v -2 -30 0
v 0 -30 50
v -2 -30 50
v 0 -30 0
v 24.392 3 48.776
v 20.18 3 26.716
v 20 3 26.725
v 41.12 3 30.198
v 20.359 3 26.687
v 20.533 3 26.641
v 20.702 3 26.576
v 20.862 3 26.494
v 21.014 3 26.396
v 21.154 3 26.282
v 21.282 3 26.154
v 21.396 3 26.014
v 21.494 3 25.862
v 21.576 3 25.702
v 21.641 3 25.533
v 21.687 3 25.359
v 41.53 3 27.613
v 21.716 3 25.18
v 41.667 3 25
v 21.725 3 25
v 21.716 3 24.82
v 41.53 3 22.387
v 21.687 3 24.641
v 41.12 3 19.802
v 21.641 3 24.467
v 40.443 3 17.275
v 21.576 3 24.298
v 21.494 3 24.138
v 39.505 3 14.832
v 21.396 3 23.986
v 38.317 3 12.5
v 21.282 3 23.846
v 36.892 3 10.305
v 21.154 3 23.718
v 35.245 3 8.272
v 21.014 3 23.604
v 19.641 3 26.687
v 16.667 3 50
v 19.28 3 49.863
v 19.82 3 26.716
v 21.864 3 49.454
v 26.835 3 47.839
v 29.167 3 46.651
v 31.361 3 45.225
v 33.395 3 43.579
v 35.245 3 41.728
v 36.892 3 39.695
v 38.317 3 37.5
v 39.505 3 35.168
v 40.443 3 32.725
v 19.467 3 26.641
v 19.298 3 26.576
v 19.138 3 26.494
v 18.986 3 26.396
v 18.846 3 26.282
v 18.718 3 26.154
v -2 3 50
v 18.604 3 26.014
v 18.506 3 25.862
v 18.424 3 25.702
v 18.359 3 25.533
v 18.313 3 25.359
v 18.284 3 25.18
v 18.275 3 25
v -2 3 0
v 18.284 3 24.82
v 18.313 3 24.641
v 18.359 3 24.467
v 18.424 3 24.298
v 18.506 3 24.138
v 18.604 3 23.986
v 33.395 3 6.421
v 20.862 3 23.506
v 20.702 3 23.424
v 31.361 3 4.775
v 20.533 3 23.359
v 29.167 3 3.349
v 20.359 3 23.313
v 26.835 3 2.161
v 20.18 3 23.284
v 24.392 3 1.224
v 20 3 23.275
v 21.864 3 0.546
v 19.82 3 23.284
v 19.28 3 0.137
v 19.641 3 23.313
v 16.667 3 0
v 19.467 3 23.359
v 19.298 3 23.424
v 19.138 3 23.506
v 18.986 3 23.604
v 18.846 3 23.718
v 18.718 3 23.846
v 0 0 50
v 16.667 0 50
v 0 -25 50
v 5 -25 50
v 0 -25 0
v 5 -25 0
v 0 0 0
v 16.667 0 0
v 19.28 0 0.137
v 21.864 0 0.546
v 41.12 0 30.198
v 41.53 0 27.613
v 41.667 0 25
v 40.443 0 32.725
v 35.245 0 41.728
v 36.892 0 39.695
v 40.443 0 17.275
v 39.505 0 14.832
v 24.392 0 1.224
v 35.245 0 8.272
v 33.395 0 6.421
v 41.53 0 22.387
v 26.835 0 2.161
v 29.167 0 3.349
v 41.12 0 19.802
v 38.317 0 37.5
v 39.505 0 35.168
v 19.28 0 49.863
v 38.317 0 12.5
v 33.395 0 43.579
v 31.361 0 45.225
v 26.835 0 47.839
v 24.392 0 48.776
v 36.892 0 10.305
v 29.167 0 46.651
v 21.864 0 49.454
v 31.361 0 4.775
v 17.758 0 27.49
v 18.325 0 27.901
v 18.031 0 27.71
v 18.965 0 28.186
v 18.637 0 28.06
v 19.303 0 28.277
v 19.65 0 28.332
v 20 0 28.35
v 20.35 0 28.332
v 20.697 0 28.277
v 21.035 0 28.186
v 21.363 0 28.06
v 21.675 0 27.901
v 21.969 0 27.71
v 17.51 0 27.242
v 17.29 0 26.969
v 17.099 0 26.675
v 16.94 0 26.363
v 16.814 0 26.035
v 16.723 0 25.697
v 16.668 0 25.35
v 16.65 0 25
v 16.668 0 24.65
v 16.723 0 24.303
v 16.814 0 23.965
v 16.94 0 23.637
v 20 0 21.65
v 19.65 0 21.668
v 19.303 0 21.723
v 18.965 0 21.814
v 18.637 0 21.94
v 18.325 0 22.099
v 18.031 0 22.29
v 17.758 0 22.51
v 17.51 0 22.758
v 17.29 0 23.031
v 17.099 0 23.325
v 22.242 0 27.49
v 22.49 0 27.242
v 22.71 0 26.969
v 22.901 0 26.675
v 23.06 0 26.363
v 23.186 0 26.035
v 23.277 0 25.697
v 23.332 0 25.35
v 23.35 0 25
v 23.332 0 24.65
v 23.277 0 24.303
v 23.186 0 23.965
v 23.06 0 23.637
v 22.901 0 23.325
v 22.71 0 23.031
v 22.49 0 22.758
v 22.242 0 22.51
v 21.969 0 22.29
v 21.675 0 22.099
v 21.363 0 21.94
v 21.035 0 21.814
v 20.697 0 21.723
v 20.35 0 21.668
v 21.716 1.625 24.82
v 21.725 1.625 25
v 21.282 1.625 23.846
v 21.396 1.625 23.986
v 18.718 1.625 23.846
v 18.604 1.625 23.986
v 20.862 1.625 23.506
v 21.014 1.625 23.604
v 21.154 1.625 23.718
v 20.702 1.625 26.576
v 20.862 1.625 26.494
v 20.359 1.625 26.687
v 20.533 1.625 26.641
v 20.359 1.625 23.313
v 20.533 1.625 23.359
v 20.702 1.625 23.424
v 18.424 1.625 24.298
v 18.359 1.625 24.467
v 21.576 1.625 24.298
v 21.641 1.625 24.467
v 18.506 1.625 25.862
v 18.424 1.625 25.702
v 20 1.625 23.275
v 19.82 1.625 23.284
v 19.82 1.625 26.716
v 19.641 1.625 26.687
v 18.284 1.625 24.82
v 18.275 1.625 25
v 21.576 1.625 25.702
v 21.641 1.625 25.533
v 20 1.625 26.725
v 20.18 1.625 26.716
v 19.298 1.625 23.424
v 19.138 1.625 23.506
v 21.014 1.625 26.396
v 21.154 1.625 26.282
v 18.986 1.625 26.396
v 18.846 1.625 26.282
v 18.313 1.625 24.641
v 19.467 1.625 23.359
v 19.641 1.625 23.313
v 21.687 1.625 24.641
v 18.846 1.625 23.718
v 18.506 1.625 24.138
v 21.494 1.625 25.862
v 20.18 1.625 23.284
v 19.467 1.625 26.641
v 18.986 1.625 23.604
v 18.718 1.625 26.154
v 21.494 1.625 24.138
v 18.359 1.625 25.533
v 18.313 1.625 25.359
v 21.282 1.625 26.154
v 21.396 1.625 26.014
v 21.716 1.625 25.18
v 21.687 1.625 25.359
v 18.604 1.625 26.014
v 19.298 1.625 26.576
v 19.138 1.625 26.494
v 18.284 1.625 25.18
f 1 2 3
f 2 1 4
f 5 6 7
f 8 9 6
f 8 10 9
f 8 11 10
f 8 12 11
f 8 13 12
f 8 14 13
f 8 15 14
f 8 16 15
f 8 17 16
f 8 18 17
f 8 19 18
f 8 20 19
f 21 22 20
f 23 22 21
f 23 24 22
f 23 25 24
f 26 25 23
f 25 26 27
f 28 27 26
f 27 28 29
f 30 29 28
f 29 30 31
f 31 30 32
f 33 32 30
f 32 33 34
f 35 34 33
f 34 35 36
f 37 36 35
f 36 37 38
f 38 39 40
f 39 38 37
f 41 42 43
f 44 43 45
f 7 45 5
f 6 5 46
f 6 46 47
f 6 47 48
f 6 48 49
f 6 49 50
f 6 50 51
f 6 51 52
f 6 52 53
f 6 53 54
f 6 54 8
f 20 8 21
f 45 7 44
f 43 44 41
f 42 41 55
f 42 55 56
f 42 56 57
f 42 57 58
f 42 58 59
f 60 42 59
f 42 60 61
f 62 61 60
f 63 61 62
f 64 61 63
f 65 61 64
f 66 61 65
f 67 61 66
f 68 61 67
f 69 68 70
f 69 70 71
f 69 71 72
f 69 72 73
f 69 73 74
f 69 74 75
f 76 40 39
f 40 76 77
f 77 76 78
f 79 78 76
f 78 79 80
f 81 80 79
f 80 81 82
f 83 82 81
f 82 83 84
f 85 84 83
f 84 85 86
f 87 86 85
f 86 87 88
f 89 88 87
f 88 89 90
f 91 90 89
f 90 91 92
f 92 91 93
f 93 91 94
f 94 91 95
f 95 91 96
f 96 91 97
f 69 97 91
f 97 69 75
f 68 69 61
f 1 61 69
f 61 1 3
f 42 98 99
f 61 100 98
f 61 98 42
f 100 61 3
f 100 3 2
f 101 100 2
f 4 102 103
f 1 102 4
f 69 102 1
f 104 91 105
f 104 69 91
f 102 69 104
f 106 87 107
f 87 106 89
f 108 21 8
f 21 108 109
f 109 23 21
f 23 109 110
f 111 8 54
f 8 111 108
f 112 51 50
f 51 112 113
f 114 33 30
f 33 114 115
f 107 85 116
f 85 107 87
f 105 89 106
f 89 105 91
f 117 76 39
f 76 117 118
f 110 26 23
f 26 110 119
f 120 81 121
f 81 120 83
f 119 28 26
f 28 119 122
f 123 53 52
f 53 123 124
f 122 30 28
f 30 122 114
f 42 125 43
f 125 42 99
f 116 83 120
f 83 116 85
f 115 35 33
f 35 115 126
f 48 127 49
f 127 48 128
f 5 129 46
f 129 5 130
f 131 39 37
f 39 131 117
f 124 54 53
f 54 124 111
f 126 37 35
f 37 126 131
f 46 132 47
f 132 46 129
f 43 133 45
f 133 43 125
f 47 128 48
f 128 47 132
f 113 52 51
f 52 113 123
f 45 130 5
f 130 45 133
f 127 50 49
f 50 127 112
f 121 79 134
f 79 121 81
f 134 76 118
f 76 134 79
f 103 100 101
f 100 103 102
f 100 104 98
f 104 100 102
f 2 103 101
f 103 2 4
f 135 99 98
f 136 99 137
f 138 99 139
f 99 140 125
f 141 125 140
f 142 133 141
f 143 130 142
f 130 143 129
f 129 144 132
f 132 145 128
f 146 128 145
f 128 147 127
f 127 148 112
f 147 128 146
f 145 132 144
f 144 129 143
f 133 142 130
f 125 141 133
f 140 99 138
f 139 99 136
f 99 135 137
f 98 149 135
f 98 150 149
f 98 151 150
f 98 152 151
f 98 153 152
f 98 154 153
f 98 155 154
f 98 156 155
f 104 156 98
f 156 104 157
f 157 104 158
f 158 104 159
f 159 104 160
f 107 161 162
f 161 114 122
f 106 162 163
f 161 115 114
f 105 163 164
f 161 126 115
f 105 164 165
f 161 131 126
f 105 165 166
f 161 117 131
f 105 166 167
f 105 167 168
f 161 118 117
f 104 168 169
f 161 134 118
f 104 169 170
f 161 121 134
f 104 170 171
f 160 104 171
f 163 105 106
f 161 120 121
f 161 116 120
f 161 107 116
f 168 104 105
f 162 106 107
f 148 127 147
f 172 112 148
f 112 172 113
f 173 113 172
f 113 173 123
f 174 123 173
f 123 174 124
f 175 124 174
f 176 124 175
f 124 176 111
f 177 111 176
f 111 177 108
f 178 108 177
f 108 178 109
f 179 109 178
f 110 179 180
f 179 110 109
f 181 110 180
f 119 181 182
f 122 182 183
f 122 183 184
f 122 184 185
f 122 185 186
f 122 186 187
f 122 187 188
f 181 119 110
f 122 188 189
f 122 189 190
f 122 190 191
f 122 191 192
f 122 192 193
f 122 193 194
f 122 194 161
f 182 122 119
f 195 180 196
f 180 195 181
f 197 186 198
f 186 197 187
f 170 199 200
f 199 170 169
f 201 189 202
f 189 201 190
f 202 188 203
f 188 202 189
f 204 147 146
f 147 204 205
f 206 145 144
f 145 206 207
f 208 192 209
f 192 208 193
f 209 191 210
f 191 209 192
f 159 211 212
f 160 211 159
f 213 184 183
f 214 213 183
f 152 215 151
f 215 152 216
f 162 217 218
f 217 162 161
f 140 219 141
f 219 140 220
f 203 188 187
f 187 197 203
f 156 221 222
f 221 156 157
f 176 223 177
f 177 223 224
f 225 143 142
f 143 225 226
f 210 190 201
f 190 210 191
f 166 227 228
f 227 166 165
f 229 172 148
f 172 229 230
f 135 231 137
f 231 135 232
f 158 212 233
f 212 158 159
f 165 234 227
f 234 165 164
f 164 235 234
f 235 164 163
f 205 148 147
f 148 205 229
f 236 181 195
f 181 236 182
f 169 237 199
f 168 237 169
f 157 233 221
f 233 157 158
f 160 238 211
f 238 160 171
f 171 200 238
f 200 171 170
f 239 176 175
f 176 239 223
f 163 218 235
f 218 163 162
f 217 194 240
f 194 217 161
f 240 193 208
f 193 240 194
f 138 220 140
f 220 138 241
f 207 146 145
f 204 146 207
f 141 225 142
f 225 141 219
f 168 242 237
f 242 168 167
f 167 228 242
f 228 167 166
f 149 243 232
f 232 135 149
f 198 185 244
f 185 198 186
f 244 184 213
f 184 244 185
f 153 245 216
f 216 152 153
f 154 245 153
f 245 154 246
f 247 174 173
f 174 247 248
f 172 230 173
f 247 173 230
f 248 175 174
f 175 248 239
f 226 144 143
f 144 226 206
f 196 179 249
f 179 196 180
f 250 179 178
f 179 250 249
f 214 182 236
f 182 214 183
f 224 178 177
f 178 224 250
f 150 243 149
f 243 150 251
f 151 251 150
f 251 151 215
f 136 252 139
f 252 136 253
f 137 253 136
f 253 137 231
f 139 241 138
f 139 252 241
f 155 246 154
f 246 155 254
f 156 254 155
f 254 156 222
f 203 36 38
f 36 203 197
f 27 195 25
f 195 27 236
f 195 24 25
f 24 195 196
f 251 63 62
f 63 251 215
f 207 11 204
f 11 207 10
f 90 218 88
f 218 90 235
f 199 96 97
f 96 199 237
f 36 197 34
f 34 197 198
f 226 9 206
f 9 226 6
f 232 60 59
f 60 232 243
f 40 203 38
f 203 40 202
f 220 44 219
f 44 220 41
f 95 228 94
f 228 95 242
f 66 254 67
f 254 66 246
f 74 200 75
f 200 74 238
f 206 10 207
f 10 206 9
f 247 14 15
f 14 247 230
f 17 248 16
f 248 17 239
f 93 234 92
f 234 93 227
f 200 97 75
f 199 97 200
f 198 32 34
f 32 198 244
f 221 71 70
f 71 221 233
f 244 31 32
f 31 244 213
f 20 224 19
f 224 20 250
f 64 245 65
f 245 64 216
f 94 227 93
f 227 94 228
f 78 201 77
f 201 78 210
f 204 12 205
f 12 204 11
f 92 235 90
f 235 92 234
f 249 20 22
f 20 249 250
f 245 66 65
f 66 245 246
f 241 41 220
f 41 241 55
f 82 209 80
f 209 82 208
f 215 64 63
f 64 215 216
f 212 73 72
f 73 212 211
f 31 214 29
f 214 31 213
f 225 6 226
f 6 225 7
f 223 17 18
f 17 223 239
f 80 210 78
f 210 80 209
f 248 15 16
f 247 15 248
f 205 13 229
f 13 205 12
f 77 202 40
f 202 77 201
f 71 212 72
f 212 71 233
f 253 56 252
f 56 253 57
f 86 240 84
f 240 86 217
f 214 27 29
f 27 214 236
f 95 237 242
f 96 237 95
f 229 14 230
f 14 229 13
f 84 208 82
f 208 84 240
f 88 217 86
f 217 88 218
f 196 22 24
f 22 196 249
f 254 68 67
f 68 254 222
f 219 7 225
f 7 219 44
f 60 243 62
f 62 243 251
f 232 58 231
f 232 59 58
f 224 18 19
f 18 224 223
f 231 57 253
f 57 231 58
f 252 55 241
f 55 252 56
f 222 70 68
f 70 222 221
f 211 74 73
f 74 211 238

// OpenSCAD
$fn=60;

module clip(width, height, thickness, tooth_size) {
    cube([thickness, width, height + tooth_size]);
    translate([thickness, 0, 0]) translate([0, 0, height]) intersection() {
        cube([tooth_size, width, tooth_size]);
        translate([0, 0, tooth_size]) rotate([0, 135, 0]) cube([tooth_size * sqrt(2), width, tooth_size * sqrt(2)]);
    }
}

module fh_screw_hole(diameter, head_diameter, length) {
    cylinder(d1=head_diameter, d2=0, h=head_diameter/2);
    cylinder(d=diameter, h=length);
}

module surface_mount_corner(
    tolerence=0.1,
    bracket_width=50,
    height=25,
    base_thickness=3,
    clip_thickness=2,
    tooth_size=5,
    screw_diameter=3.45,
    screw_head_diameter=6.90
) {
    rotate([90, 0, 0]) translate([-clip_thickness, -clip_thickness, -base_thickness]) difference() {
        intersection() {
            cube([clip_thickness + bracket_width, clip_thickness + bracket_width, height + tooth_size + base_thickness]);
            cylinder(h=height + tooth_size + base_thickness, r=bracket_width + clip_thickness);
            union() {
                cube([bracket_width + clip_thickness, bracket_width + clip_thickness, base_thickness]);
                translate([0, 0, base_thickness]) clip(width=bracket_width + clip_thickness, height=height, thickness=clip_thickness, tooth_size=tooth_size);
                translate([clip_thickness + tooth_size + tolerence, 0, 0]) mirror([1, 0, 0]) rotate([0, 0, 90]) clip(width=bracket_width + clip_thickness, height=height, thickness=clip_thickness, tooth_size=tooth_size);
            }
        }
        translate([bracket_width/2.5, bracket_width/2.5, base_thickness + 0.1]) rotate([180, 0, 0]) fh_screw_hole(diameter=screw_diameter, head_diameter=screw_head_diameter, length=base_thickness+0.2);
    }
}

module surface_mount_side(
    bracket_width=50,
    height=25,
    base_thickness=3,
    clip_thickness=2,
    tooth_size=5,
    screw_diameter=3.45,
    screw_head_diameter=6.90
) {
    rotate([90, 0, 0]) translate([-clip_thickness, 0, -base_thickness]) difference() {
        intersection() {
            cube([bracket_width + clip_thickness, bracket_width + clip_thickness, height + tooth_size + base_thickness]);
            union() {
                cube([bracket_width/3 + clip_thickness, bracket_width, height + tooth_size + base_thickness]);
                translate([bracket_width/3 + clip_thickness, bracket_width/2, 0]) cylinder(h=height + tooth_size + base_thickness, d=bracket_width);
            }
            union() {
                cube([bracket_width + clip_thickness, bracket_width, base_thickness]);
                translate([0, 0, base_thickness]) clip(width=bracket_width, height=height, thickness=clip_thickness, tooth_size=tooth_size);
            }
        }
        translate([clip_thickness + bracket_width/2.5, bracket_width/2, base_thickness + 0.1]) rotate([180, 0, 0]) fh_screw_hole(diameter=screw_diameter, head_diameter=screw_head_diameter, length=base_thickness+0.2);
    }
}

surface_mount_side();
